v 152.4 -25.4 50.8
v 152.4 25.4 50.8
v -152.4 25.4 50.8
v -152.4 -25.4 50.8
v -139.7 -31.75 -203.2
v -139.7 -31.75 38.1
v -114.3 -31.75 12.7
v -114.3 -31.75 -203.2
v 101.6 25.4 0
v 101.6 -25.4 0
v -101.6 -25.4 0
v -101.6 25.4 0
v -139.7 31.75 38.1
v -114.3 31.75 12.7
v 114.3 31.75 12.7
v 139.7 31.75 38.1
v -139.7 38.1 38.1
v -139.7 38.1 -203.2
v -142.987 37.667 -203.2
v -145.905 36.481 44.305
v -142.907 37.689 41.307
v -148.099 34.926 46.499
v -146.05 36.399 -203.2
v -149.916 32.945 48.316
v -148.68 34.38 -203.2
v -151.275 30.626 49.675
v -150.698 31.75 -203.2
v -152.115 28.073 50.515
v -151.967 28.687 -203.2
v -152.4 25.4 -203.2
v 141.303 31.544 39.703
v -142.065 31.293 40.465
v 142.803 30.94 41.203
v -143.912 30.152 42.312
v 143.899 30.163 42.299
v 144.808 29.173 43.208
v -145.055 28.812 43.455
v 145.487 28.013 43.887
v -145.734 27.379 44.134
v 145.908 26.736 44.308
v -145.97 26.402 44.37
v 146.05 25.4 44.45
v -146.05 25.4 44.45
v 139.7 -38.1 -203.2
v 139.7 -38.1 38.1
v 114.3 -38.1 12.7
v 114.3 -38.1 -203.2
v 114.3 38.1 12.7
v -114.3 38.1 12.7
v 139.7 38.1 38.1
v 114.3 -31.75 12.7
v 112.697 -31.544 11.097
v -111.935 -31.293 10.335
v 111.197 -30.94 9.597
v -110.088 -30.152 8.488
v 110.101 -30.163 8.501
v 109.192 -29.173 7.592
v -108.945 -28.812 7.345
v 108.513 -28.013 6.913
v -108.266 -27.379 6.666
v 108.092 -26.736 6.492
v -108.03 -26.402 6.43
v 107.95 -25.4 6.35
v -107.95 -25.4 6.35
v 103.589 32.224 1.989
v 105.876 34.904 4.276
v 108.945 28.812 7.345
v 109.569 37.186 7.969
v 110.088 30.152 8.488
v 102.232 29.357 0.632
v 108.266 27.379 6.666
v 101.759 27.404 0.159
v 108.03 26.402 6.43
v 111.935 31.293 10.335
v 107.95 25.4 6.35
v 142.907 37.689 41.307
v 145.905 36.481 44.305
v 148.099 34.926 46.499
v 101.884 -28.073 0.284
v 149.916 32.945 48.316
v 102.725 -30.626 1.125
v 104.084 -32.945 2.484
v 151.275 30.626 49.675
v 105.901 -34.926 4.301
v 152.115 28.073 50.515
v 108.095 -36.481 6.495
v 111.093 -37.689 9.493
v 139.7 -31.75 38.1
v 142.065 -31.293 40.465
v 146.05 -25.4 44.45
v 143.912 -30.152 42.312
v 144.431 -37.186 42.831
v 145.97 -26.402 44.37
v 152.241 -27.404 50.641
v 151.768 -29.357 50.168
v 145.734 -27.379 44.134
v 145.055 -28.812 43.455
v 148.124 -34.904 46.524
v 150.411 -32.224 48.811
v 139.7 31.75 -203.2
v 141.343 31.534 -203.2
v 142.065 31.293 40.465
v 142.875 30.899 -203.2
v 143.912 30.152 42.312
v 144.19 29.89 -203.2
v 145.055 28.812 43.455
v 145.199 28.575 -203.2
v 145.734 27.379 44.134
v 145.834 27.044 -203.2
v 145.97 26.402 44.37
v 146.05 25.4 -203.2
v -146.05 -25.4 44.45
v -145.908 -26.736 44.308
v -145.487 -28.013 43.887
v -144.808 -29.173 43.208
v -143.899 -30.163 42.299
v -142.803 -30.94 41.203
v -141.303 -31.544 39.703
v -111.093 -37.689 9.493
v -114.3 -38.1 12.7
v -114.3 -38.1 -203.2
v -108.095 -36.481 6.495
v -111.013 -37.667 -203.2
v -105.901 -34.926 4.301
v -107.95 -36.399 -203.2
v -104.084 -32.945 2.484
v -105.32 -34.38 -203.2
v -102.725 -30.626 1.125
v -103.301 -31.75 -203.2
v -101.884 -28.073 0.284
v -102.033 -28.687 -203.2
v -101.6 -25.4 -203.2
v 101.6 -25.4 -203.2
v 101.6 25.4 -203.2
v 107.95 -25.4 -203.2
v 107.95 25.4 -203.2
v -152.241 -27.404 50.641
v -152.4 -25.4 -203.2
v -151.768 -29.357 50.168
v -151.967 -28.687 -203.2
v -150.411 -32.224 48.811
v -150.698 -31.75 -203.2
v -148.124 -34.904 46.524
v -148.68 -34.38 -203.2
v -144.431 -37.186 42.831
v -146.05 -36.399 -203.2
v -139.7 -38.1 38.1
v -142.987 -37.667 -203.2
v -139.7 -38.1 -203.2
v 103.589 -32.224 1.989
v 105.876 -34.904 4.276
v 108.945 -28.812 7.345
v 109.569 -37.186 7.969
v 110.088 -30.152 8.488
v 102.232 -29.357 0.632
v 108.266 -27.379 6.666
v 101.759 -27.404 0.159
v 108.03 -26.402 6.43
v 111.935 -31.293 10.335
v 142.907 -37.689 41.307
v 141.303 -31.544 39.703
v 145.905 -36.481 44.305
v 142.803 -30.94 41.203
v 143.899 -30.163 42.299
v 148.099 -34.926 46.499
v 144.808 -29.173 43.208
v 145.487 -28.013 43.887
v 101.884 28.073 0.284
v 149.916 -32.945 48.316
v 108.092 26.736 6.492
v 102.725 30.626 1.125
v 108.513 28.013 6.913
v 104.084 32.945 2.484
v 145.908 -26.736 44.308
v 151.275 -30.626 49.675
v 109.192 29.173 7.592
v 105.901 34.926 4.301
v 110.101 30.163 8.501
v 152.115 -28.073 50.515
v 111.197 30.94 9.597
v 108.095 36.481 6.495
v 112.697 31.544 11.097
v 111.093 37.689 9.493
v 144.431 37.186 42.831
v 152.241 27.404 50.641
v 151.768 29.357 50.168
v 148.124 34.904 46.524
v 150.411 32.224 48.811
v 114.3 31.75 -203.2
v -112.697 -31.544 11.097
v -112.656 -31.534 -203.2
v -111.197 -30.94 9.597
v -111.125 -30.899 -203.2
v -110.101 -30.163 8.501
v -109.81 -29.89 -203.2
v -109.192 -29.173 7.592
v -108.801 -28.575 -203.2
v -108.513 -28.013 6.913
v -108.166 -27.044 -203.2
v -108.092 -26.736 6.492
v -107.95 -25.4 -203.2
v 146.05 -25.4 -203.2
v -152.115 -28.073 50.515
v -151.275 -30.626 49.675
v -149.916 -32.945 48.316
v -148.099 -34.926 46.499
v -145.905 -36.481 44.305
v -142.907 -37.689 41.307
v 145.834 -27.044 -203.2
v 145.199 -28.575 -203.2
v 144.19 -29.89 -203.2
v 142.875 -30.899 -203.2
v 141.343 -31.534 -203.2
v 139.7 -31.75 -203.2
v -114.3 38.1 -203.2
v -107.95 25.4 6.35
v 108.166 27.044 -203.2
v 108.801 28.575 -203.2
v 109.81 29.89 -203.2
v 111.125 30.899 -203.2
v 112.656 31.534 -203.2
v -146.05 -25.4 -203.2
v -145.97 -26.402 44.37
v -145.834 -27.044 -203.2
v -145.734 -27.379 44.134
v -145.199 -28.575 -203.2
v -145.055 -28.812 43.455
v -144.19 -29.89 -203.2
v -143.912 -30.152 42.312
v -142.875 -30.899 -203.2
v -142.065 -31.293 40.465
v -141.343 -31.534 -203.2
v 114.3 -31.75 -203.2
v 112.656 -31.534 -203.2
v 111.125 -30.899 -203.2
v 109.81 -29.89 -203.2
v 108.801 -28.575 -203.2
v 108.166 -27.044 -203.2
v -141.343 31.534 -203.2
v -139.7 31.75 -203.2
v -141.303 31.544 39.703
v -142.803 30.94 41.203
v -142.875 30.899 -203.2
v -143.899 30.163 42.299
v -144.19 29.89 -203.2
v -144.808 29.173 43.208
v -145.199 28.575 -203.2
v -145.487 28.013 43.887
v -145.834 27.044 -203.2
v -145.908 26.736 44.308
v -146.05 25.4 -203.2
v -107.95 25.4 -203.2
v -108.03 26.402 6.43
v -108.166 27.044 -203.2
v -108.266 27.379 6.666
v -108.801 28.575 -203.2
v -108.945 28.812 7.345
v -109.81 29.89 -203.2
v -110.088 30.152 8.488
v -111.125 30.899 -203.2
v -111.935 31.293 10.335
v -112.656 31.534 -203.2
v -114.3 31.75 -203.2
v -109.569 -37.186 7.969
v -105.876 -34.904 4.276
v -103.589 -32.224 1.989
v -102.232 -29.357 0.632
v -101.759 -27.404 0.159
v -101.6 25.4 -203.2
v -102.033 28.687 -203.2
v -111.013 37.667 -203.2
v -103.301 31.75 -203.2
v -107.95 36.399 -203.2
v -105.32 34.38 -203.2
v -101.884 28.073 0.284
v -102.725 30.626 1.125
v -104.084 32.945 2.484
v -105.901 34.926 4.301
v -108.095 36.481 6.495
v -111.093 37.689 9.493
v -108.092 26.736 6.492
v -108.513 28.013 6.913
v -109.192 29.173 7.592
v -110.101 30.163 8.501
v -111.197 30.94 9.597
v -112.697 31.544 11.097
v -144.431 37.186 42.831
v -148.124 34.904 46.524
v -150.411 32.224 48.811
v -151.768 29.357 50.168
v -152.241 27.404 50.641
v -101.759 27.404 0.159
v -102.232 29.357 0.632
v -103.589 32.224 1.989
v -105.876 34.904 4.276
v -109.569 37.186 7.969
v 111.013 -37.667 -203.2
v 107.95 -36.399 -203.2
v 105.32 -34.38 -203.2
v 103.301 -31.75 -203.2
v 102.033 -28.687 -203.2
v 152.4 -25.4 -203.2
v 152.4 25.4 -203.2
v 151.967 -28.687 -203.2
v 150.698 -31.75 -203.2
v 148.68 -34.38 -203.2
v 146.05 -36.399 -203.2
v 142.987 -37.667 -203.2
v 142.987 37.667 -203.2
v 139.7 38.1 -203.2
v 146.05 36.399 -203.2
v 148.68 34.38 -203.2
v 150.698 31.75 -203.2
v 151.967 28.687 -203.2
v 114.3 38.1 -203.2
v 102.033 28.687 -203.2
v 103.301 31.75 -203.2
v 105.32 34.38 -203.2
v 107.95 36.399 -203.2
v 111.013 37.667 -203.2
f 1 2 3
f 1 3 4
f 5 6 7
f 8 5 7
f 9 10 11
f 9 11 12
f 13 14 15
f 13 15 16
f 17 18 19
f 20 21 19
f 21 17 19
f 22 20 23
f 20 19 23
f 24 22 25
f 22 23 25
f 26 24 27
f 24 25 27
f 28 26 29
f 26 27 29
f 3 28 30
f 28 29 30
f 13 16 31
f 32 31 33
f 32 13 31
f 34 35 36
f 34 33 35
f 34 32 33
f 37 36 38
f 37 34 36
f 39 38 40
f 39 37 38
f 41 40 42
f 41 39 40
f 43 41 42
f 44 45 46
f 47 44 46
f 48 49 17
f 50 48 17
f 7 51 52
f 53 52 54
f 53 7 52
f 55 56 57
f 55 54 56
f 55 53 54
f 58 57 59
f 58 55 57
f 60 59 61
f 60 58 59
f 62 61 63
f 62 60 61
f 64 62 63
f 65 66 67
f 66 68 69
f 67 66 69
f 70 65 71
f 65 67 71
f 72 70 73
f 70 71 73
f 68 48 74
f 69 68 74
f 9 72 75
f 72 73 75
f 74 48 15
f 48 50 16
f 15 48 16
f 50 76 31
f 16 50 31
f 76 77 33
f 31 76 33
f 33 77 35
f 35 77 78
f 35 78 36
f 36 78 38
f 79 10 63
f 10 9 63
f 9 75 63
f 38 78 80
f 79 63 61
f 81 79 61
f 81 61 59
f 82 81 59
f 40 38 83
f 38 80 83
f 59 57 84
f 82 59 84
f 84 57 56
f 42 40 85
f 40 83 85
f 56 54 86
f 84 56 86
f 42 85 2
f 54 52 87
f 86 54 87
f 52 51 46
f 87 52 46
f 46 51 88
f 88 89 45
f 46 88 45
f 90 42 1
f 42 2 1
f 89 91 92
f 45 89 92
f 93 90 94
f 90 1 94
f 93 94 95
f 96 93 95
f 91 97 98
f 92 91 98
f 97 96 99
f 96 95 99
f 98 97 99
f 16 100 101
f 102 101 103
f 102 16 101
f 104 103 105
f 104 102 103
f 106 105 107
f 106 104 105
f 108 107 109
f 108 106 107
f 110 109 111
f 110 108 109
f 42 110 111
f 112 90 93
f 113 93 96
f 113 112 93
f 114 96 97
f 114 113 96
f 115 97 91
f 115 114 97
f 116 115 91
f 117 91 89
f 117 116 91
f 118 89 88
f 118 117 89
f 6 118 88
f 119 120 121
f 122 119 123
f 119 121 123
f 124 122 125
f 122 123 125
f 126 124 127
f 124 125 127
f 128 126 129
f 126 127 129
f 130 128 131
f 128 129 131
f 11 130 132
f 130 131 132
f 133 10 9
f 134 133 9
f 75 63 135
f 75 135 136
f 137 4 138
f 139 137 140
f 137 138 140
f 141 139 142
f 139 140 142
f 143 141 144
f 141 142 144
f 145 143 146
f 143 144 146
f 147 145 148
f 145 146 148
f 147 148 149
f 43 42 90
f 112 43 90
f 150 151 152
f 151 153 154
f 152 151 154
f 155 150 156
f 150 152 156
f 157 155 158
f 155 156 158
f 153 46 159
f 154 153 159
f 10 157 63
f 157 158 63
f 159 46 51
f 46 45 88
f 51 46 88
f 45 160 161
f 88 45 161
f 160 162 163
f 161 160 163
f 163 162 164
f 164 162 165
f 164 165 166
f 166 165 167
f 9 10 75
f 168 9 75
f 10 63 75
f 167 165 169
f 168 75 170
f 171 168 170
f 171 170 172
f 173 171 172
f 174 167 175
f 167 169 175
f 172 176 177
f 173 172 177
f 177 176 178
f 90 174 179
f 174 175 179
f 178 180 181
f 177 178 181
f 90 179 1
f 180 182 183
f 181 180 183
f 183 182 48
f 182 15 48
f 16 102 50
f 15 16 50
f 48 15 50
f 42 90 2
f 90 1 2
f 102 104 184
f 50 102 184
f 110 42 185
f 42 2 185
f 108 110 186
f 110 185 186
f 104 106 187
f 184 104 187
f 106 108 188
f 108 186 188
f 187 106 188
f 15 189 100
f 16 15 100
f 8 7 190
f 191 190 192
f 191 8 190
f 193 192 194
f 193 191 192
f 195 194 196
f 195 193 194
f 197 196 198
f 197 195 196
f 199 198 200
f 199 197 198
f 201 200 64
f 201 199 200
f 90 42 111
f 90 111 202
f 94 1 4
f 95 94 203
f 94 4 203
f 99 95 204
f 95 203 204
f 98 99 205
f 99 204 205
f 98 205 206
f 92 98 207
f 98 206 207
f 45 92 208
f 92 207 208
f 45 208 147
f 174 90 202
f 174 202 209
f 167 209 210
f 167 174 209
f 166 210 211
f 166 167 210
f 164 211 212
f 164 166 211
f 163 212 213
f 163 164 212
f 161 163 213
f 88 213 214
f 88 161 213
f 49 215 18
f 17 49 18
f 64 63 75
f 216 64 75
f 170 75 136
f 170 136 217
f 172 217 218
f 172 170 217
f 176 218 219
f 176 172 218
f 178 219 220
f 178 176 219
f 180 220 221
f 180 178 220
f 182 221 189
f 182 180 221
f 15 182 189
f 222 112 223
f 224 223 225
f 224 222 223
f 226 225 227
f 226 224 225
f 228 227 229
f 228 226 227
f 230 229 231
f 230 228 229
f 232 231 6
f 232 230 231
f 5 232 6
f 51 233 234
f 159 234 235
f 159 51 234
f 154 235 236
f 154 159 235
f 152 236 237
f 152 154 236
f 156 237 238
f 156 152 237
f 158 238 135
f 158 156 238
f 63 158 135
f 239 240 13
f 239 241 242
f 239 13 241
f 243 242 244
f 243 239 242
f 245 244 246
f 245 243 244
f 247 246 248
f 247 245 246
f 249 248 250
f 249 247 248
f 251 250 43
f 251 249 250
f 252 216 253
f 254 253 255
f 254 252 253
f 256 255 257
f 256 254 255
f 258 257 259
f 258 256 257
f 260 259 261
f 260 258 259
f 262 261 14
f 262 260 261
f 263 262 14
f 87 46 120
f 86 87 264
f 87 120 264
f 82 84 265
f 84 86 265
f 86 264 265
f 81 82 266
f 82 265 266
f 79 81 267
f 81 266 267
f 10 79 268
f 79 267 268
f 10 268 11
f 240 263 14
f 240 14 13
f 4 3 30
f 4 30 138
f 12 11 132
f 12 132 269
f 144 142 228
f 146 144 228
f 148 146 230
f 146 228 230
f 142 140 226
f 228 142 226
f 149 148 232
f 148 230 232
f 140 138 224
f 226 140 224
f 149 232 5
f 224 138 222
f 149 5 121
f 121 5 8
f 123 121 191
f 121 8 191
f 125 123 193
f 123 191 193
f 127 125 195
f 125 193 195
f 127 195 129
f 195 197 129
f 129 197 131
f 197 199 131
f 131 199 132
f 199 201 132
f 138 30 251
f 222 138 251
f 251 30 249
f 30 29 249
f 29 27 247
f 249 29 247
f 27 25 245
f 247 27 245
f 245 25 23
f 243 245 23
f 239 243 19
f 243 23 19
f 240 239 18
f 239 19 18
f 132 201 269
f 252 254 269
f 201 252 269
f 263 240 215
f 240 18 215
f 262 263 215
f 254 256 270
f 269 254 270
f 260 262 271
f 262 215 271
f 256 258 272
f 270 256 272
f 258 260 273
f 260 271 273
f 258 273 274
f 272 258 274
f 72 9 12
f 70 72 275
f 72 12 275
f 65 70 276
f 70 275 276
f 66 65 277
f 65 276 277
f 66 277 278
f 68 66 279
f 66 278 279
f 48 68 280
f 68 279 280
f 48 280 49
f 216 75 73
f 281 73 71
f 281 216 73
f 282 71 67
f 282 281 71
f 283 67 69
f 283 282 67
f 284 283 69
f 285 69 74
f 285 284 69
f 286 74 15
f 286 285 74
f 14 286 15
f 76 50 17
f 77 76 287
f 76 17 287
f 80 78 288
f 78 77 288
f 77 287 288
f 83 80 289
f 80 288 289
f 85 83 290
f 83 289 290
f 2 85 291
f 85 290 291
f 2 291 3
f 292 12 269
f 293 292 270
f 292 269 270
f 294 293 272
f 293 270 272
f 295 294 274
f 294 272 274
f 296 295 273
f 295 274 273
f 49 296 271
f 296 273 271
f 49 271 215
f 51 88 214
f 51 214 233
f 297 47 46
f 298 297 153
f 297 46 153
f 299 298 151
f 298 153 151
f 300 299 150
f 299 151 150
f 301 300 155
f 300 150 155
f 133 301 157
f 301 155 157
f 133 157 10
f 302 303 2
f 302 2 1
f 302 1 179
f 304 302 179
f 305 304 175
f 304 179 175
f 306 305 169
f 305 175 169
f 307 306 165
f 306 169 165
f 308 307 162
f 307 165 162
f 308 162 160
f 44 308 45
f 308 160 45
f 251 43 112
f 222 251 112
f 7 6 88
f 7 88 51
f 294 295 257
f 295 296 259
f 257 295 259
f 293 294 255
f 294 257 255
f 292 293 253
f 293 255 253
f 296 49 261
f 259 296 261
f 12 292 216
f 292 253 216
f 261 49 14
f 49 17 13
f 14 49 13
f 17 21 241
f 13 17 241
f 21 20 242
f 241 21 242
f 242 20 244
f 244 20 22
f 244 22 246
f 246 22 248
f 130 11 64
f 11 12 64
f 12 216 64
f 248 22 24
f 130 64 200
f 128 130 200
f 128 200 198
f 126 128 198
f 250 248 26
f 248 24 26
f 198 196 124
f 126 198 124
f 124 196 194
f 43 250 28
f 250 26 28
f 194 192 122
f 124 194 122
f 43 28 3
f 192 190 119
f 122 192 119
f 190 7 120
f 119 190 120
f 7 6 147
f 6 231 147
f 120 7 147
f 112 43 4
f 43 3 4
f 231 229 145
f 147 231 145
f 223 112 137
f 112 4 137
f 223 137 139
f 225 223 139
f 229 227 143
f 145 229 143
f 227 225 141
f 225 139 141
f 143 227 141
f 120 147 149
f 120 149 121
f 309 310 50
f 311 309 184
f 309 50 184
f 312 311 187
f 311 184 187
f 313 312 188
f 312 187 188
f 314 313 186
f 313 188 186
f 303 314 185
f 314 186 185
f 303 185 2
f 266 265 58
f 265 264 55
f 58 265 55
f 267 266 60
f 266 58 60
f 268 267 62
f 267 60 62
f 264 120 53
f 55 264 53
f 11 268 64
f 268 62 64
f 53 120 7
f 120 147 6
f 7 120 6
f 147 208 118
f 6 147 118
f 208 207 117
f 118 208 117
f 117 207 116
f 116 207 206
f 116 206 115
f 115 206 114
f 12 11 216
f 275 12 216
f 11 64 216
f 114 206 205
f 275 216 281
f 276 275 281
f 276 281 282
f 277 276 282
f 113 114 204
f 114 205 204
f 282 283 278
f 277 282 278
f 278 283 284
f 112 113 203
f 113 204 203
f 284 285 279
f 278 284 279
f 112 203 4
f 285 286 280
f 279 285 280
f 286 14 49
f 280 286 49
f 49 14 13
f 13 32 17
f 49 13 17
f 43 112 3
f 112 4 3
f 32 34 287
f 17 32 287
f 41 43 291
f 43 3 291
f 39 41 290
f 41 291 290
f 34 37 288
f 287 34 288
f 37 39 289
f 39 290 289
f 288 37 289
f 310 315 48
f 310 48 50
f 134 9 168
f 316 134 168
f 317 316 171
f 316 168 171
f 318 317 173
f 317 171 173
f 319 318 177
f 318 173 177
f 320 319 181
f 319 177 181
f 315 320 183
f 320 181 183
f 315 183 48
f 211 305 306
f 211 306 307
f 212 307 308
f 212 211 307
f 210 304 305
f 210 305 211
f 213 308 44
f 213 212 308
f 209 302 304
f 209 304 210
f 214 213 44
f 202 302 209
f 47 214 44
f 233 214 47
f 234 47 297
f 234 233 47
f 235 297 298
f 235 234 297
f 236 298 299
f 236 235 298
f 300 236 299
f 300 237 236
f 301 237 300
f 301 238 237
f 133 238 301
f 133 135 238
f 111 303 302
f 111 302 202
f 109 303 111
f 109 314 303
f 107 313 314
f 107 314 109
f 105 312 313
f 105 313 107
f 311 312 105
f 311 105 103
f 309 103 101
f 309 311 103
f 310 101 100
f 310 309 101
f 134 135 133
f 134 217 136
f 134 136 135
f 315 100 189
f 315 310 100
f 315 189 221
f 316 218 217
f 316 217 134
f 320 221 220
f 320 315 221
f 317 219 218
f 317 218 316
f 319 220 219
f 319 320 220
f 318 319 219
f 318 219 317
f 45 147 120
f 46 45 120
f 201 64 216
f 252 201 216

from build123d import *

# Parameters (mm, degrees)
RECTANGULAR_TUBE_CONFIGURED_3_X_2_X_0_DEPTH    = 275.39046704
RECTANGULAR_TUBE_CONFIGURED_3_X_2_3_DEPTH      = 347.58093408
RECTANGULAR_TUBE_CONFIGURED_3_X_2_5_DEPTH      = 203.2
RECTANGULAR_TUBE_CONFIGURED_3_X_2_5_DEPTH_BACK = 72.19046704


with BuildPart() as part:
    # Sketch11 on segment 1 (carried to segment 1) → Rectangular tube - configured 3 X 2 X 0.25(1) (new body)
    with BuildSketch(Plane(origin=(-126.999978029, 0, -203.2), x_dir=(1, 0, 0), z_dir=(0, 0, 1))):
        with BuildLine():
            Line((-12.699978029, -38.1), (12.699978029, -38.1))
            ThreePointArc((12.699978029, -38.1), (21.68023415, -34.380256121), (25.399978029, -25.4))
            Line((25.399978029, -25.4), (25.399978029, 25.4))
            ThreePointArc((25.399978029, 25.4), (21.68023415, 34.380256121), (12.699978029, 38.1))
            Line((12.699978029, 38.1), (-12.699978029, 38.1))
            ThreePointArc((-12.699978029, 38.1), (-21.68023415, 34.380256121), (-25.399978029, 25.4))
            Line((-25.399978029, 25.4), (-25.399978029, -25.4))
            ThreePointArc((-25.399978029, -25.4), (-21.68023415, -34.380256121), (-12.699978029, -38.1))
        make_face()
        with BuildLine():
            Line((-12.699978029, -31.75), (12.699978029, -31.75))
            ThreePointArc((12.699978029, -31.75), (17.19010609, -29.890128061), (19.049978029, -25.4))
            Line((19.049978029, -25.4), (19.049978029, 25.4))
            ThreePointArc((19.049978029, 25.4), (17.19010609, 29.890128061), (12.699978029, 31.75))
            Line((12.699978029, 31.75), (-12.699978029, 31.75))
            ThreePointArc((-12.699978029, 31.75), (-17.19010609, 29.890128061), (-19.049978029, 25.4))
            Line((-19.049978029, 25.4), (-19.049978029, -25.4))
            ThreePointArc((-19.049978029, -25.4), (-17.19010609, -29.890128061), (-12.699978029, -31.75))
        make_face(mode=Mode.SUBTRACT)
    extrude(amount=RECTANGULAR_TUBE_CONFIGURED_3_X_2_X_0_DEPTH)

    # Rectangular tube - configured 3 X 2  2
    split(bisect_by=Plane(origin=(-101.6, 0, 0), x_dir=(0, -1, 0), z_dir=(-0.707106781, 0, -0.707106781)), keep=Keep.TOP)


with BuildPart() as body_2:
    # Sketch11 on segment 2 (carried to segment 2) → Rectangular tube - configured 3 X 2  3 (new body)
    with BuildSketch(Plane(origin=(-173.79046704, 0, 25.399978029), x_dir=(0, 0, -1), z_dir=(1, 0, 0))):
        with BuildLine():
            Line((-12.699978029, -38.1), (12.699978029, -38.1))
            ThreePointArc((12.699978029, -38.1), (21.68023415, -34.380256121), (25.399978029, -25.4))
            Line((25.399978029, -25.4), (25.399978029, 25.4))
            ThreePointArc((25.399978029, 25.4), (21.68023415, 34.380256121), (12.699978029, 38.1))
            Line((12.699978029, 38.1), (-12.699978029, 38.1))
            ThreePointArc((-12.699978029, 38.1), (-21.68023415, 34.380256121), (-25.399978029, 25.4))
            Line((-25.399978029, 25.4), (-25.399978029, -25.4))
            ThreePointArc((-25.399978029, -25.4), (-21.68023415, -34.380256121), (-12.699978029, -38.1))
        make_face()
        with BuildLine():
            Line((-12.699978029, -31.75), (12.699978029, -31.75))
            ThreePointArc((12.699978029, -31.75), (17.19010609, -29.890128061), (19.049978029, -25.4))
            Line((19.049978029, -25.4), (19.049978029, 25.4))
            ThreePointArc((19.049978029, 25.4), (17.19010609, 29.890128061), (12.699978029, 31.75))
            Line((12.699978029, 31.75), (-12.699978029, 31.75))
            ThreePointArc((-12.699978029, 31.75), (-17.19010609, 29.890128061), (-19.049978029, 25.4))
            Line((-19.049978029, 25.4), (-19.049978029, -25.4))
            ThreePointArc((-19.049978029, -25.4), (-17.19010609, -29.890128061), (-12.699978029, -31.75))
        make_face(mode=Mode.SUBTRACT)
    extrude(amount=RECTANGULAR_TUBE_CONFIGURED_3_X_2_3_DEPTH)

    # Rectangular tube - configured 3 X 2 3 mi
    split(bisect_by=Plane(origin=(-101.6, 0, 0), x_dir=(0, 1, 0), z_dir=(0.707106781, 0, 0.707106781)), keep=Keep.TOP)

    # Rectangular tube - configured 3 X 2  4
    split(bisect_by=Plane(origin=(101.6, 0, 0), x_dir=(0, -1, 0), z_dir=(-0.707106781, 0, 0.707106781)), keep=Keep.TOP)


with BuildPart() as body_3:
    # Sketch11 → Rectangular tube - configured 3 X 2  5 (new, two sides: drawn at the far end of the back side and taken through both)
    with BuildSketch(Plane(origin=(126.999978029, 0, 0), x_dir=(-1, 0, 0), z_dir=(0, 0, -1)).offset(-RECTANGULAR_TUBE_CONFIGURED_3_X_2_5_DEPTH_BACK)):
        with BuildLine():
            Line((-12.699978029, -38.1), (12.699978029, -38.1))
            ThreePointArc((12.699978029, -38.1), (21.68023415, -34.380256121), (25.399978029, -25.4))
            Line((25.399978029, -25.4), (25.399978029, 25.4))
            ThreePointArc((25.399978029, 25.4), (21.68023415, 34.380256121), (12.699978029, 38.1))
            Line((12.699978029, 38.1), (-12.699978029, 38.1))
            ThreePointArc((-12.699978029, 38.1), (-21.68023415, 34.380256121), (-25.399978029, 25.4))
            Line((-25.399978029, 25.4), (-25.399978029, -25.4))
            ThreePointArc((-25.399978029, -25.4), (-21.68023415, -34.380256121), (-12.699978029, -38.1))
        make_face()
        with BuildLine():
            Line((-12.699978029, -31.75), (12.699978029, -31.75))
            ThreePointArc((12.699978029, -31.75), (17.19010609, -29.890128061), (19.049978029, -25.4))
            Line((19.049978029, -25.4), (19.049978029, 25.4))
            ThreePointArc((19.049978029, 25.4), (17.19010609, 29.890128061), (12.699978029, 31.75))
            Line((12.699978029, 31.75), (-12.699978029, 31.75))
            ThreePointArc((-12.699978029, 31.75), (-17.19010609, 29.890128061), (-19.049978029, 25.4))
            Line((-19.049978029, 25.4), (-19.049978029, -25.4))
            ThreePointArc((-19.049978029, -25.4), (-17.19010609, -29.890128061), (-12.699978029, -31.75))
        make_face(mode=Mode.SUBTRACT)
    extrude(amount=RECTANGULAR_TUBE_CONFIGURED_3_X_2_5_DEPTH + RECTANGULAR_TUBE_CONFIGURED_3_X_2_5_DEPTH_BACK)

    # Rectangular tube - configured 3 X 2 5 mi
    split(bisect_by=Plane(origin=(101.6, 0, 0), x_dir=(0, 1, 0), z_dir=(0.707106781, 0, -0.707106781)), keep=Keep.TOP)


solid = Compound([part.part, body_2.part, body_3.part])
